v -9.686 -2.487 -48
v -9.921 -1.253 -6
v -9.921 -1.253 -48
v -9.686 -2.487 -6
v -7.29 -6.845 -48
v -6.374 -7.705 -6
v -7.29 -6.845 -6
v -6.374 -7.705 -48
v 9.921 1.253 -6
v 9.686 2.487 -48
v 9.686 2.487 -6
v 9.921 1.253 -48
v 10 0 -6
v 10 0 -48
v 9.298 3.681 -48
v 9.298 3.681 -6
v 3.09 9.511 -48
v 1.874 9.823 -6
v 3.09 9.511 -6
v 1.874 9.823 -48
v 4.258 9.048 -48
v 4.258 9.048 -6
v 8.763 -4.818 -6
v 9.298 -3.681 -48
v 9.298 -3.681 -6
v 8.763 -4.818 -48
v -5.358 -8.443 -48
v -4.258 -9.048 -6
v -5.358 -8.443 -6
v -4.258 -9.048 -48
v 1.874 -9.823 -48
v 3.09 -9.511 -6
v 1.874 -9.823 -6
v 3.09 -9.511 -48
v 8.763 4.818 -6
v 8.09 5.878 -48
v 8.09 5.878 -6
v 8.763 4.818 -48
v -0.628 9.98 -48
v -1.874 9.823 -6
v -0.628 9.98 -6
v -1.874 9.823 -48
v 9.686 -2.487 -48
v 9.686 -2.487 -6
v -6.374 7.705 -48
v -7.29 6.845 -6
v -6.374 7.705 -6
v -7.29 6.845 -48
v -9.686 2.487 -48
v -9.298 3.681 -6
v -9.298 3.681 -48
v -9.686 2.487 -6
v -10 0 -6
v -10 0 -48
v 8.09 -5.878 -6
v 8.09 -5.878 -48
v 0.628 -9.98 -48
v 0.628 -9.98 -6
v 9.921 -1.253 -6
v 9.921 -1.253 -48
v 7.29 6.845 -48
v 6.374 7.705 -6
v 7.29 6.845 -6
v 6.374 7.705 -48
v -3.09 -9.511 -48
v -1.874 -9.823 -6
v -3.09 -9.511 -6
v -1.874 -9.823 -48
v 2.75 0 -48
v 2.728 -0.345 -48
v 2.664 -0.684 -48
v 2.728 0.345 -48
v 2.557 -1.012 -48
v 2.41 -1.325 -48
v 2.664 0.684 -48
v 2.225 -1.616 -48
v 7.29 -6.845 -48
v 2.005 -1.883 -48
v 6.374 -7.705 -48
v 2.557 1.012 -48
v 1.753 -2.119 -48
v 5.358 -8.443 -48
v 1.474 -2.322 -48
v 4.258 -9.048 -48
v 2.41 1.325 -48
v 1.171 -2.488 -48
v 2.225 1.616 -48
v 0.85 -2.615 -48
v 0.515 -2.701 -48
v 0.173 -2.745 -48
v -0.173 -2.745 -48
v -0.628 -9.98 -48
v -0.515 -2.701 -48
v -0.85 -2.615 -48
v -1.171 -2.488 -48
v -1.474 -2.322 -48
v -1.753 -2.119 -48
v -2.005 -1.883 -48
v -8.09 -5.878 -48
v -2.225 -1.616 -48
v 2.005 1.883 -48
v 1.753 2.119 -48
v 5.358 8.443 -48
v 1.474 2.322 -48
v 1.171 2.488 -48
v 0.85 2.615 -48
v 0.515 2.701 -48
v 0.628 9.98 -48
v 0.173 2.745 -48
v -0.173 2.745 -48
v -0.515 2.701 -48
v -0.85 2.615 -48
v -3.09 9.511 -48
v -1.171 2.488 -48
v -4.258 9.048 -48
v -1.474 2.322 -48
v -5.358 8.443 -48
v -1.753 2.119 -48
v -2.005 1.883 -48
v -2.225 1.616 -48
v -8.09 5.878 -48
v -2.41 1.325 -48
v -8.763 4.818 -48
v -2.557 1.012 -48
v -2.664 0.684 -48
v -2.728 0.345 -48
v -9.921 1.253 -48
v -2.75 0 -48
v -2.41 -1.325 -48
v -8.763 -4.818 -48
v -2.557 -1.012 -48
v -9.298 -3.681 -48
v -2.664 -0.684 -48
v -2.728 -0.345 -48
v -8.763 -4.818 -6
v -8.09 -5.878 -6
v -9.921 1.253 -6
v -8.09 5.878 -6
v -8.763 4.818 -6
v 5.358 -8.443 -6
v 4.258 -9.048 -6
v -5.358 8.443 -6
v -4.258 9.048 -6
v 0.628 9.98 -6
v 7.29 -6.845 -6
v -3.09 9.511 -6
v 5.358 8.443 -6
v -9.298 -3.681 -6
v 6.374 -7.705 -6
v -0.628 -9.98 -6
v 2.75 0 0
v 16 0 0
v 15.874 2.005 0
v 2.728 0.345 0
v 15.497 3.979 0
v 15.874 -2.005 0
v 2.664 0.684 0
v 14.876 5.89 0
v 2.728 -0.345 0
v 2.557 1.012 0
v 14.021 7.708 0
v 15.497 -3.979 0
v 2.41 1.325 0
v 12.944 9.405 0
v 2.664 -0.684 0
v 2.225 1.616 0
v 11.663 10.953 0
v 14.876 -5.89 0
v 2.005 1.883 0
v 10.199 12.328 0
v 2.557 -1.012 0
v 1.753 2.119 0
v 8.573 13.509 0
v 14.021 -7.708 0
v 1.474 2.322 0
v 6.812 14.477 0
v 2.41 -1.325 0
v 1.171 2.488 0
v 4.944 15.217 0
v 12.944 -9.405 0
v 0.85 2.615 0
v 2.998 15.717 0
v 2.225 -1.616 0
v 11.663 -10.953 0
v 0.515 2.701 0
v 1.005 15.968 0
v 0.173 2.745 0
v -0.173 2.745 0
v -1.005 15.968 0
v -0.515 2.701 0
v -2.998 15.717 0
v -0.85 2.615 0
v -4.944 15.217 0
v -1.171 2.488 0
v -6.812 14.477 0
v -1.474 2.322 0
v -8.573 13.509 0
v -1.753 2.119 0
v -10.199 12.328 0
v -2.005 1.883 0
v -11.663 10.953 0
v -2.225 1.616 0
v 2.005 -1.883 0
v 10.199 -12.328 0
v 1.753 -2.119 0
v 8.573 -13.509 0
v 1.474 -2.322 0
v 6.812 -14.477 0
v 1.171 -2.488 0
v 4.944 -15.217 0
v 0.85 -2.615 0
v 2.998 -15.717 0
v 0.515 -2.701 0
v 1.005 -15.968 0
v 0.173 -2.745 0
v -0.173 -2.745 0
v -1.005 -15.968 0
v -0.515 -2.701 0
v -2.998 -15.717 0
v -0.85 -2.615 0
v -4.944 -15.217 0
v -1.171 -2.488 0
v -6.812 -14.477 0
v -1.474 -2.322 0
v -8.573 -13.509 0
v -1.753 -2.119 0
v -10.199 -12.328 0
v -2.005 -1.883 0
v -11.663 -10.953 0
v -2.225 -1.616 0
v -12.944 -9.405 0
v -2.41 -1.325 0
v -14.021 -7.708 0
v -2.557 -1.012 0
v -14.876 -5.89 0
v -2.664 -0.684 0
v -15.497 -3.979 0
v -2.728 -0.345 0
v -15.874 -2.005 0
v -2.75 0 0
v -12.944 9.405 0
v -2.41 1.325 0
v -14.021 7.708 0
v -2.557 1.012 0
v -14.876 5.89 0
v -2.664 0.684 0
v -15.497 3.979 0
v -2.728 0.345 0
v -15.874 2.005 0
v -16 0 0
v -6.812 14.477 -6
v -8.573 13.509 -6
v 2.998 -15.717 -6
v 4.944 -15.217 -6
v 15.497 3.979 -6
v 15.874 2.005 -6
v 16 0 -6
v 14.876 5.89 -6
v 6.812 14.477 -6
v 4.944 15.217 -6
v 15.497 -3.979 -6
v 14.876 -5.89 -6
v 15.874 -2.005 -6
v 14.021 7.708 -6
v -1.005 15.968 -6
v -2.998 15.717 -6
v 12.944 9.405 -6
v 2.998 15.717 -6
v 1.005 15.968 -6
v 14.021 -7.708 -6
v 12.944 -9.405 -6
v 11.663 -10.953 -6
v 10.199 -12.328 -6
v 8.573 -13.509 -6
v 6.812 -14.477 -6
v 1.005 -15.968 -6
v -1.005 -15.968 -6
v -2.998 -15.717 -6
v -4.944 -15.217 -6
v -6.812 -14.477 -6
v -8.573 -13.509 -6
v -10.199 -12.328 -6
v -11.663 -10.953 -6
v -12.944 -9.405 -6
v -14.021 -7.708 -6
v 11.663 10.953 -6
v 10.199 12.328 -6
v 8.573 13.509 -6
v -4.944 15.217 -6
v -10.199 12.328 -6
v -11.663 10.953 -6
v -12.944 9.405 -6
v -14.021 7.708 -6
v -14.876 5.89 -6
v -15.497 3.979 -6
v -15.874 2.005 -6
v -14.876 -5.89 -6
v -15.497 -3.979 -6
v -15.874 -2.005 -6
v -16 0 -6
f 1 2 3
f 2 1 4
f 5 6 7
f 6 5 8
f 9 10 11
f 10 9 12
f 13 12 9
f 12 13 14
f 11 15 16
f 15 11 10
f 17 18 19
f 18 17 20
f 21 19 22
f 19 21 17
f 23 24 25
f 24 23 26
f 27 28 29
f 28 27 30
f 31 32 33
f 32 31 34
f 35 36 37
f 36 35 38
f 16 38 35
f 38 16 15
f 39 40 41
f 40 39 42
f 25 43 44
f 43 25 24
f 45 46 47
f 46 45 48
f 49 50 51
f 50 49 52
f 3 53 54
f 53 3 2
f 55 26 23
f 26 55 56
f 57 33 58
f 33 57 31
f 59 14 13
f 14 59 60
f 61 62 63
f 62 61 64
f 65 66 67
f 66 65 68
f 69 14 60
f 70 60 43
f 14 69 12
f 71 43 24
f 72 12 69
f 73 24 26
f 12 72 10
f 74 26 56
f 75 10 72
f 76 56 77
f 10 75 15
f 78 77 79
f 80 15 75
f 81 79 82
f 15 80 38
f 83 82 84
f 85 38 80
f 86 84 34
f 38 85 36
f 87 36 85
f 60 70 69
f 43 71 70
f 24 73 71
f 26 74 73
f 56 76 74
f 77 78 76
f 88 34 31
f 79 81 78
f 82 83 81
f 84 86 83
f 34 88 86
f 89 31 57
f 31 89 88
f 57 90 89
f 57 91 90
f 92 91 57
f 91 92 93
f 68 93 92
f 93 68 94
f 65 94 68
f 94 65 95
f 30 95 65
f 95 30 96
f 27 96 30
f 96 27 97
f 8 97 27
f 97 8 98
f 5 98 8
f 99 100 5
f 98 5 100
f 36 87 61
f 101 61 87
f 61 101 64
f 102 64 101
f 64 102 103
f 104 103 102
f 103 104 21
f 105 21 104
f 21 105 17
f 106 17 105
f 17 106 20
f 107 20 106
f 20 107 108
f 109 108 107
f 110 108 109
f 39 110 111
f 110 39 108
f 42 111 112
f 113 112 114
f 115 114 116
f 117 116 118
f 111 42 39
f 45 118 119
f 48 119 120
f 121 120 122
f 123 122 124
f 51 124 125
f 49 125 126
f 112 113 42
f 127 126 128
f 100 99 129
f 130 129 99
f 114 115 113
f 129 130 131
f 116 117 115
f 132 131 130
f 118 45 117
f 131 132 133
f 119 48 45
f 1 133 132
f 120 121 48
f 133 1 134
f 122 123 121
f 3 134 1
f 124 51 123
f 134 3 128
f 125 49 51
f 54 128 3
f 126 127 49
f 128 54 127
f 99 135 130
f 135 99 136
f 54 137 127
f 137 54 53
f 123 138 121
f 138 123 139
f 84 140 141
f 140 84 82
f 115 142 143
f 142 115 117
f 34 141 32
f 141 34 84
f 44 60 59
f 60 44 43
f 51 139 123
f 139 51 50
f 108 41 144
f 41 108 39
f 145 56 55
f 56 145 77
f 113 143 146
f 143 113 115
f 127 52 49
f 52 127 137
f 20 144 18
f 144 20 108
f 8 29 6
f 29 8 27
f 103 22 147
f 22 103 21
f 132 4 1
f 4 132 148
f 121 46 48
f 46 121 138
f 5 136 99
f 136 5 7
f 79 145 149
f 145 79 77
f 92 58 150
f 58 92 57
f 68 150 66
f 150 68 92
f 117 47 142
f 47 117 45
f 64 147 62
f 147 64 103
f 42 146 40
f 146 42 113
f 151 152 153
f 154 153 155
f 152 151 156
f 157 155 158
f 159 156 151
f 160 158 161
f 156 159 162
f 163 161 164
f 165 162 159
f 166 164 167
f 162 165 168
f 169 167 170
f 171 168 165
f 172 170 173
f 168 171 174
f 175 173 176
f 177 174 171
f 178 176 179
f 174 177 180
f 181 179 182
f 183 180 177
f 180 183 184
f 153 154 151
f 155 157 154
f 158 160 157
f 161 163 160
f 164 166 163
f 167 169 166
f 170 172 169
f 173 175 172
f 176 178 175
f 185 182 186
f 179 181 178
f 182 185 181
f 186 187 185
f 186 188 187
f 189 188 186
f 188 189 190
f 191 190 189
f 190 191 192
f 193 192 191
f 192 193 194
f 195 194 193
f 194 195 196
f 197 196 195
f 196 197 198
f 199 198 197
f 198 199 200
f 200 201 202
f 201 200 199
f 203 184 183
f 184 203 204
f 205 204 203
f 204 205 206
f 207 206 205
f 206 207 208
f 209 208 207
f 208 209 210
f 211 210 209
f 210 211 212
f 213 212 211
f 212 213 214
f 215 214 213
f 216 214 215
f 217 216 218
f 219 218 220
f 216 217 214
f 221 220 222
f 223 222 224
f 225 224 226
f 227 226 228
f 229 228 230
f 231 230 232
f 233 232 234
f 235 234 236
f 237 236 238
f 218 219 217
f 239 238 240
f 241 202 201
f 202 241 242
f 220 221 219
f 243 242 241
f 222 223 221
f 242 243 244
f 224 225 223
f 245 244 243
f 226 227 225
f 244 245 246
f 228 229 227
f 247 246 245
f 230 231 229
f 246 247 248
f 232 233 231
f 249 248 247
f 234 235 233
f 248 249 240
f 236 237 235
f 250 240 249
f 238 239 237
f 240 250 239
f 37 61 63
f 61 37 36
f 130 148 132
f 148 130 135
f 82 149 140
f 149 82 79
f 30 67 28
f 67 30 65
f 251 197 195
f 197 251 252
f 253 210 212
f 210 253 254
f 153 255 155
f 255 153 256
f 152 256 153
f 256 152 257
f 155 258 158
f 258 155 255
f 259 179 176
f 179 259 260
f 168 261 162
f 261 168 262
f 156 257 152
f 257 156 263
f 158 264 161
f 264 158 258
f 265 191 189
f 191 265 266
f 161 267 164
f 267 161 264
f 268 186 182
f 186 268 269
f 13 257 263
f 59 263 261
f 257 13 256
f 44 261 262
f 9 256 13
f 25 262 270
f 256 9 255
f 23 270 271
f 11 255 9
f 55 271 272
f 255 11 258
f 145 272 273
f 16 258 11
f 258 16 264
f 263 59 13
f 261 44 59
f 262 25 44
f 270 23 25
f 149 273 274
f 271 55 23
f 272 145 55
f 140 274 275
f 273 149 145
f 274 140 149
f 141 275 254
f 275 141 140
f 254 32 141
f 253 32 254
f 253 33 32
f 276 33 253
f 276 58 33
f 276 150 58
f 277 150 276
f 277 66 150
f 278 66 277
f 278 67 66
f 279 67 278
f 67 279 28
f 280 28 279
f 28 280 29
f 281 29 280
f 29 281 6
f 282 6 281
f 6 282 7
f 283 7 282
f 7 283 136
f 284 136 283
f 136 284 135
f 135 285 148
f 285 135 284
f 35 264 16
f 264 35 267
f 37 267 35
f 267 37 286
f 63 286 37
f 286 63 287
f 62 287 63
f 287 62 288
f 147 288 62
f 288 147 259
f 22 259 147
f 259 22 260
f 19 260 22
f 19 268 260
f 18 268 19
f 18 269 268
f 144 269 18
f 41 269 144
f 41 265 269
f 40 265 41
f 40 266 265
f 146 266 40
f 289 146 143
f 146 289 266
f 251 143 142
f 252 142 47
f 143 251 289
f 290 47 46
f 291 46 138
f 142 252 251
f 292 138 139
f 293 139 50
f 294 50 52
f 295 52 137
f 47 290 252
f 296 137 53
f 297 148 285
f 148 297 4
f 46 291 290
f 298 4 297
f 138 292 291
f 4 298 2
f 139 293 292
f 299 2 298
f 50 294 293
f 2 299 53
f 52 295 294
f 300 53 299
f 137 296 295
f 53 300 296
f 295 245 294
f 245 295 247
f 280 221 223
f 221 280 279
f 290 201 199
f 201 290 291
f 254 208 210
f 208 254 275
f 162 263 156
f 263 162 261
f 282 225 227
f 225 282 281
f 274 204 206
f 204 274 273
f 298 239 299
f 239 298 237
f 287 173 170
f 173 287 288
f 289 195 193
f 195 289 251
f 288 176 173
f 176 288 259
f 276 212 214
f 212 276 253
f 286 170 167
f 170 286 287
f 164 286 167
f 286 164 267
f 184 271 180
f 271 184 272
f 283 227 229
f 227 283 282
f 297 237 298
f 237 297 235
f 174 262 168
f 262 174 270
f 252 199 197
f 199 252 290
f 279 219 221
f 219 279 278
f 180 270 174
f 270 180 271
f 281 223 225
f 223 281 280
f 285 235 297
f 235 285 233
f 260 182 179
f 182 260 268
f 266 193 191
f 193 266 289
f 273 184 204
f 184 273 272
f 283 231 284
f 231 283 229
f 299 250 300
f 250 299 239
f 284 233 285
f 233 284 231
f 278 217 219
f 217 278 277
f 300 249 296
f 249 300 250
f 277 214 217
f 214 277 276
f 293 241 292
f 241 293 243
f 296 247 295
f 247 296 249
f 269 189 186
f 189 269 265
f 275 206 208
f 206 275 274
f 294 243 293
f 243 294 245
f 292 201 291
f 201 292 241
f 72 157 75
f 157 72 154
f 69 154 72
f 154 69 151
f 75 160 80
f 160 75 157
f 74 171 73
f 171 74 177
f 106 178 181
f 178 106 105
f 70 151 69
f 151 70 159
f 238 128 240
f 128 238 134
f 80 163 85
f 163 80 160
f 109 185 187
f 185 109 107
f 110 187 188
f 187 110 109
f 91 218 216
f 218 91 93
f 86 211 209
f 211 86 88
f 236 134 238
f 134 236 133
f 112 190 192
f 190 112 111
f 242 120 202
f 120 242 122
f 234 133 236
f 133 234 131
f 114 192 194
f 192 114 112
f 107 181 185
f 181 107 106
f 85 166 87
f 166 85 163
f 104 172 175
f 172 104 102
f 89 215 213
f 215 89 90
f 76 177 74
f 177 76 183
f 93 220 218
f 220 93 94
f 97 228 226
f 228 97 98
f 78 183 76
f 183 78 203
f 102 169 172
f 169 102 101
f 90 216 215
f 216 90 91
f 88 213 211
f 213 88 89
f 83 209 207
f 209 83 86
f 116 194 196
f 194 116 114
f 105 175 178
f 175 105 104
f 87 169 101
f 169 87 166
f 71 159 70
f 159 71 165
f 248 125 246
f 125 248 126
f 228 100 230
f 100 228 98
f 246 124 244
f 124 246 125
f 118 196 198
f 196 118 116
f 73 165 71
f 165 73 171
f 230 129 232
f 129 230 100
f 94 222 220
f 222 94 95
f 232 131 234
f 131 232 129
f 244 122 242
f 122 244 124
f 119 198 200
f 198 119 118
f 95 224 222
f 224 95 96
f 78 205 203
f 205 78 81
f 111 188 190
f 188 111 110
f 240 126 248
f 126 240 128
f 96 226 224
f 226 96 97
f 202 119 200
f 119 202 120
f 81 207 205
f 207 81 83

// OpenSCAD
$fn = 50;


difference() {
	union() {
		translate(v = [0, 0, -48.0000000000]) {
			cylinder(h = 48, r = 10.0000000000);
		}
		translate(v = [0, 0, -6.0000000000]) {
			cylinder(h = 6, r = 16.0000000000);
		}
	}
	union() {
		#translate(v = [0, 0, -48]) {
			cylinder(h = 48, r = 2.7500000000);
		}
	}
}
